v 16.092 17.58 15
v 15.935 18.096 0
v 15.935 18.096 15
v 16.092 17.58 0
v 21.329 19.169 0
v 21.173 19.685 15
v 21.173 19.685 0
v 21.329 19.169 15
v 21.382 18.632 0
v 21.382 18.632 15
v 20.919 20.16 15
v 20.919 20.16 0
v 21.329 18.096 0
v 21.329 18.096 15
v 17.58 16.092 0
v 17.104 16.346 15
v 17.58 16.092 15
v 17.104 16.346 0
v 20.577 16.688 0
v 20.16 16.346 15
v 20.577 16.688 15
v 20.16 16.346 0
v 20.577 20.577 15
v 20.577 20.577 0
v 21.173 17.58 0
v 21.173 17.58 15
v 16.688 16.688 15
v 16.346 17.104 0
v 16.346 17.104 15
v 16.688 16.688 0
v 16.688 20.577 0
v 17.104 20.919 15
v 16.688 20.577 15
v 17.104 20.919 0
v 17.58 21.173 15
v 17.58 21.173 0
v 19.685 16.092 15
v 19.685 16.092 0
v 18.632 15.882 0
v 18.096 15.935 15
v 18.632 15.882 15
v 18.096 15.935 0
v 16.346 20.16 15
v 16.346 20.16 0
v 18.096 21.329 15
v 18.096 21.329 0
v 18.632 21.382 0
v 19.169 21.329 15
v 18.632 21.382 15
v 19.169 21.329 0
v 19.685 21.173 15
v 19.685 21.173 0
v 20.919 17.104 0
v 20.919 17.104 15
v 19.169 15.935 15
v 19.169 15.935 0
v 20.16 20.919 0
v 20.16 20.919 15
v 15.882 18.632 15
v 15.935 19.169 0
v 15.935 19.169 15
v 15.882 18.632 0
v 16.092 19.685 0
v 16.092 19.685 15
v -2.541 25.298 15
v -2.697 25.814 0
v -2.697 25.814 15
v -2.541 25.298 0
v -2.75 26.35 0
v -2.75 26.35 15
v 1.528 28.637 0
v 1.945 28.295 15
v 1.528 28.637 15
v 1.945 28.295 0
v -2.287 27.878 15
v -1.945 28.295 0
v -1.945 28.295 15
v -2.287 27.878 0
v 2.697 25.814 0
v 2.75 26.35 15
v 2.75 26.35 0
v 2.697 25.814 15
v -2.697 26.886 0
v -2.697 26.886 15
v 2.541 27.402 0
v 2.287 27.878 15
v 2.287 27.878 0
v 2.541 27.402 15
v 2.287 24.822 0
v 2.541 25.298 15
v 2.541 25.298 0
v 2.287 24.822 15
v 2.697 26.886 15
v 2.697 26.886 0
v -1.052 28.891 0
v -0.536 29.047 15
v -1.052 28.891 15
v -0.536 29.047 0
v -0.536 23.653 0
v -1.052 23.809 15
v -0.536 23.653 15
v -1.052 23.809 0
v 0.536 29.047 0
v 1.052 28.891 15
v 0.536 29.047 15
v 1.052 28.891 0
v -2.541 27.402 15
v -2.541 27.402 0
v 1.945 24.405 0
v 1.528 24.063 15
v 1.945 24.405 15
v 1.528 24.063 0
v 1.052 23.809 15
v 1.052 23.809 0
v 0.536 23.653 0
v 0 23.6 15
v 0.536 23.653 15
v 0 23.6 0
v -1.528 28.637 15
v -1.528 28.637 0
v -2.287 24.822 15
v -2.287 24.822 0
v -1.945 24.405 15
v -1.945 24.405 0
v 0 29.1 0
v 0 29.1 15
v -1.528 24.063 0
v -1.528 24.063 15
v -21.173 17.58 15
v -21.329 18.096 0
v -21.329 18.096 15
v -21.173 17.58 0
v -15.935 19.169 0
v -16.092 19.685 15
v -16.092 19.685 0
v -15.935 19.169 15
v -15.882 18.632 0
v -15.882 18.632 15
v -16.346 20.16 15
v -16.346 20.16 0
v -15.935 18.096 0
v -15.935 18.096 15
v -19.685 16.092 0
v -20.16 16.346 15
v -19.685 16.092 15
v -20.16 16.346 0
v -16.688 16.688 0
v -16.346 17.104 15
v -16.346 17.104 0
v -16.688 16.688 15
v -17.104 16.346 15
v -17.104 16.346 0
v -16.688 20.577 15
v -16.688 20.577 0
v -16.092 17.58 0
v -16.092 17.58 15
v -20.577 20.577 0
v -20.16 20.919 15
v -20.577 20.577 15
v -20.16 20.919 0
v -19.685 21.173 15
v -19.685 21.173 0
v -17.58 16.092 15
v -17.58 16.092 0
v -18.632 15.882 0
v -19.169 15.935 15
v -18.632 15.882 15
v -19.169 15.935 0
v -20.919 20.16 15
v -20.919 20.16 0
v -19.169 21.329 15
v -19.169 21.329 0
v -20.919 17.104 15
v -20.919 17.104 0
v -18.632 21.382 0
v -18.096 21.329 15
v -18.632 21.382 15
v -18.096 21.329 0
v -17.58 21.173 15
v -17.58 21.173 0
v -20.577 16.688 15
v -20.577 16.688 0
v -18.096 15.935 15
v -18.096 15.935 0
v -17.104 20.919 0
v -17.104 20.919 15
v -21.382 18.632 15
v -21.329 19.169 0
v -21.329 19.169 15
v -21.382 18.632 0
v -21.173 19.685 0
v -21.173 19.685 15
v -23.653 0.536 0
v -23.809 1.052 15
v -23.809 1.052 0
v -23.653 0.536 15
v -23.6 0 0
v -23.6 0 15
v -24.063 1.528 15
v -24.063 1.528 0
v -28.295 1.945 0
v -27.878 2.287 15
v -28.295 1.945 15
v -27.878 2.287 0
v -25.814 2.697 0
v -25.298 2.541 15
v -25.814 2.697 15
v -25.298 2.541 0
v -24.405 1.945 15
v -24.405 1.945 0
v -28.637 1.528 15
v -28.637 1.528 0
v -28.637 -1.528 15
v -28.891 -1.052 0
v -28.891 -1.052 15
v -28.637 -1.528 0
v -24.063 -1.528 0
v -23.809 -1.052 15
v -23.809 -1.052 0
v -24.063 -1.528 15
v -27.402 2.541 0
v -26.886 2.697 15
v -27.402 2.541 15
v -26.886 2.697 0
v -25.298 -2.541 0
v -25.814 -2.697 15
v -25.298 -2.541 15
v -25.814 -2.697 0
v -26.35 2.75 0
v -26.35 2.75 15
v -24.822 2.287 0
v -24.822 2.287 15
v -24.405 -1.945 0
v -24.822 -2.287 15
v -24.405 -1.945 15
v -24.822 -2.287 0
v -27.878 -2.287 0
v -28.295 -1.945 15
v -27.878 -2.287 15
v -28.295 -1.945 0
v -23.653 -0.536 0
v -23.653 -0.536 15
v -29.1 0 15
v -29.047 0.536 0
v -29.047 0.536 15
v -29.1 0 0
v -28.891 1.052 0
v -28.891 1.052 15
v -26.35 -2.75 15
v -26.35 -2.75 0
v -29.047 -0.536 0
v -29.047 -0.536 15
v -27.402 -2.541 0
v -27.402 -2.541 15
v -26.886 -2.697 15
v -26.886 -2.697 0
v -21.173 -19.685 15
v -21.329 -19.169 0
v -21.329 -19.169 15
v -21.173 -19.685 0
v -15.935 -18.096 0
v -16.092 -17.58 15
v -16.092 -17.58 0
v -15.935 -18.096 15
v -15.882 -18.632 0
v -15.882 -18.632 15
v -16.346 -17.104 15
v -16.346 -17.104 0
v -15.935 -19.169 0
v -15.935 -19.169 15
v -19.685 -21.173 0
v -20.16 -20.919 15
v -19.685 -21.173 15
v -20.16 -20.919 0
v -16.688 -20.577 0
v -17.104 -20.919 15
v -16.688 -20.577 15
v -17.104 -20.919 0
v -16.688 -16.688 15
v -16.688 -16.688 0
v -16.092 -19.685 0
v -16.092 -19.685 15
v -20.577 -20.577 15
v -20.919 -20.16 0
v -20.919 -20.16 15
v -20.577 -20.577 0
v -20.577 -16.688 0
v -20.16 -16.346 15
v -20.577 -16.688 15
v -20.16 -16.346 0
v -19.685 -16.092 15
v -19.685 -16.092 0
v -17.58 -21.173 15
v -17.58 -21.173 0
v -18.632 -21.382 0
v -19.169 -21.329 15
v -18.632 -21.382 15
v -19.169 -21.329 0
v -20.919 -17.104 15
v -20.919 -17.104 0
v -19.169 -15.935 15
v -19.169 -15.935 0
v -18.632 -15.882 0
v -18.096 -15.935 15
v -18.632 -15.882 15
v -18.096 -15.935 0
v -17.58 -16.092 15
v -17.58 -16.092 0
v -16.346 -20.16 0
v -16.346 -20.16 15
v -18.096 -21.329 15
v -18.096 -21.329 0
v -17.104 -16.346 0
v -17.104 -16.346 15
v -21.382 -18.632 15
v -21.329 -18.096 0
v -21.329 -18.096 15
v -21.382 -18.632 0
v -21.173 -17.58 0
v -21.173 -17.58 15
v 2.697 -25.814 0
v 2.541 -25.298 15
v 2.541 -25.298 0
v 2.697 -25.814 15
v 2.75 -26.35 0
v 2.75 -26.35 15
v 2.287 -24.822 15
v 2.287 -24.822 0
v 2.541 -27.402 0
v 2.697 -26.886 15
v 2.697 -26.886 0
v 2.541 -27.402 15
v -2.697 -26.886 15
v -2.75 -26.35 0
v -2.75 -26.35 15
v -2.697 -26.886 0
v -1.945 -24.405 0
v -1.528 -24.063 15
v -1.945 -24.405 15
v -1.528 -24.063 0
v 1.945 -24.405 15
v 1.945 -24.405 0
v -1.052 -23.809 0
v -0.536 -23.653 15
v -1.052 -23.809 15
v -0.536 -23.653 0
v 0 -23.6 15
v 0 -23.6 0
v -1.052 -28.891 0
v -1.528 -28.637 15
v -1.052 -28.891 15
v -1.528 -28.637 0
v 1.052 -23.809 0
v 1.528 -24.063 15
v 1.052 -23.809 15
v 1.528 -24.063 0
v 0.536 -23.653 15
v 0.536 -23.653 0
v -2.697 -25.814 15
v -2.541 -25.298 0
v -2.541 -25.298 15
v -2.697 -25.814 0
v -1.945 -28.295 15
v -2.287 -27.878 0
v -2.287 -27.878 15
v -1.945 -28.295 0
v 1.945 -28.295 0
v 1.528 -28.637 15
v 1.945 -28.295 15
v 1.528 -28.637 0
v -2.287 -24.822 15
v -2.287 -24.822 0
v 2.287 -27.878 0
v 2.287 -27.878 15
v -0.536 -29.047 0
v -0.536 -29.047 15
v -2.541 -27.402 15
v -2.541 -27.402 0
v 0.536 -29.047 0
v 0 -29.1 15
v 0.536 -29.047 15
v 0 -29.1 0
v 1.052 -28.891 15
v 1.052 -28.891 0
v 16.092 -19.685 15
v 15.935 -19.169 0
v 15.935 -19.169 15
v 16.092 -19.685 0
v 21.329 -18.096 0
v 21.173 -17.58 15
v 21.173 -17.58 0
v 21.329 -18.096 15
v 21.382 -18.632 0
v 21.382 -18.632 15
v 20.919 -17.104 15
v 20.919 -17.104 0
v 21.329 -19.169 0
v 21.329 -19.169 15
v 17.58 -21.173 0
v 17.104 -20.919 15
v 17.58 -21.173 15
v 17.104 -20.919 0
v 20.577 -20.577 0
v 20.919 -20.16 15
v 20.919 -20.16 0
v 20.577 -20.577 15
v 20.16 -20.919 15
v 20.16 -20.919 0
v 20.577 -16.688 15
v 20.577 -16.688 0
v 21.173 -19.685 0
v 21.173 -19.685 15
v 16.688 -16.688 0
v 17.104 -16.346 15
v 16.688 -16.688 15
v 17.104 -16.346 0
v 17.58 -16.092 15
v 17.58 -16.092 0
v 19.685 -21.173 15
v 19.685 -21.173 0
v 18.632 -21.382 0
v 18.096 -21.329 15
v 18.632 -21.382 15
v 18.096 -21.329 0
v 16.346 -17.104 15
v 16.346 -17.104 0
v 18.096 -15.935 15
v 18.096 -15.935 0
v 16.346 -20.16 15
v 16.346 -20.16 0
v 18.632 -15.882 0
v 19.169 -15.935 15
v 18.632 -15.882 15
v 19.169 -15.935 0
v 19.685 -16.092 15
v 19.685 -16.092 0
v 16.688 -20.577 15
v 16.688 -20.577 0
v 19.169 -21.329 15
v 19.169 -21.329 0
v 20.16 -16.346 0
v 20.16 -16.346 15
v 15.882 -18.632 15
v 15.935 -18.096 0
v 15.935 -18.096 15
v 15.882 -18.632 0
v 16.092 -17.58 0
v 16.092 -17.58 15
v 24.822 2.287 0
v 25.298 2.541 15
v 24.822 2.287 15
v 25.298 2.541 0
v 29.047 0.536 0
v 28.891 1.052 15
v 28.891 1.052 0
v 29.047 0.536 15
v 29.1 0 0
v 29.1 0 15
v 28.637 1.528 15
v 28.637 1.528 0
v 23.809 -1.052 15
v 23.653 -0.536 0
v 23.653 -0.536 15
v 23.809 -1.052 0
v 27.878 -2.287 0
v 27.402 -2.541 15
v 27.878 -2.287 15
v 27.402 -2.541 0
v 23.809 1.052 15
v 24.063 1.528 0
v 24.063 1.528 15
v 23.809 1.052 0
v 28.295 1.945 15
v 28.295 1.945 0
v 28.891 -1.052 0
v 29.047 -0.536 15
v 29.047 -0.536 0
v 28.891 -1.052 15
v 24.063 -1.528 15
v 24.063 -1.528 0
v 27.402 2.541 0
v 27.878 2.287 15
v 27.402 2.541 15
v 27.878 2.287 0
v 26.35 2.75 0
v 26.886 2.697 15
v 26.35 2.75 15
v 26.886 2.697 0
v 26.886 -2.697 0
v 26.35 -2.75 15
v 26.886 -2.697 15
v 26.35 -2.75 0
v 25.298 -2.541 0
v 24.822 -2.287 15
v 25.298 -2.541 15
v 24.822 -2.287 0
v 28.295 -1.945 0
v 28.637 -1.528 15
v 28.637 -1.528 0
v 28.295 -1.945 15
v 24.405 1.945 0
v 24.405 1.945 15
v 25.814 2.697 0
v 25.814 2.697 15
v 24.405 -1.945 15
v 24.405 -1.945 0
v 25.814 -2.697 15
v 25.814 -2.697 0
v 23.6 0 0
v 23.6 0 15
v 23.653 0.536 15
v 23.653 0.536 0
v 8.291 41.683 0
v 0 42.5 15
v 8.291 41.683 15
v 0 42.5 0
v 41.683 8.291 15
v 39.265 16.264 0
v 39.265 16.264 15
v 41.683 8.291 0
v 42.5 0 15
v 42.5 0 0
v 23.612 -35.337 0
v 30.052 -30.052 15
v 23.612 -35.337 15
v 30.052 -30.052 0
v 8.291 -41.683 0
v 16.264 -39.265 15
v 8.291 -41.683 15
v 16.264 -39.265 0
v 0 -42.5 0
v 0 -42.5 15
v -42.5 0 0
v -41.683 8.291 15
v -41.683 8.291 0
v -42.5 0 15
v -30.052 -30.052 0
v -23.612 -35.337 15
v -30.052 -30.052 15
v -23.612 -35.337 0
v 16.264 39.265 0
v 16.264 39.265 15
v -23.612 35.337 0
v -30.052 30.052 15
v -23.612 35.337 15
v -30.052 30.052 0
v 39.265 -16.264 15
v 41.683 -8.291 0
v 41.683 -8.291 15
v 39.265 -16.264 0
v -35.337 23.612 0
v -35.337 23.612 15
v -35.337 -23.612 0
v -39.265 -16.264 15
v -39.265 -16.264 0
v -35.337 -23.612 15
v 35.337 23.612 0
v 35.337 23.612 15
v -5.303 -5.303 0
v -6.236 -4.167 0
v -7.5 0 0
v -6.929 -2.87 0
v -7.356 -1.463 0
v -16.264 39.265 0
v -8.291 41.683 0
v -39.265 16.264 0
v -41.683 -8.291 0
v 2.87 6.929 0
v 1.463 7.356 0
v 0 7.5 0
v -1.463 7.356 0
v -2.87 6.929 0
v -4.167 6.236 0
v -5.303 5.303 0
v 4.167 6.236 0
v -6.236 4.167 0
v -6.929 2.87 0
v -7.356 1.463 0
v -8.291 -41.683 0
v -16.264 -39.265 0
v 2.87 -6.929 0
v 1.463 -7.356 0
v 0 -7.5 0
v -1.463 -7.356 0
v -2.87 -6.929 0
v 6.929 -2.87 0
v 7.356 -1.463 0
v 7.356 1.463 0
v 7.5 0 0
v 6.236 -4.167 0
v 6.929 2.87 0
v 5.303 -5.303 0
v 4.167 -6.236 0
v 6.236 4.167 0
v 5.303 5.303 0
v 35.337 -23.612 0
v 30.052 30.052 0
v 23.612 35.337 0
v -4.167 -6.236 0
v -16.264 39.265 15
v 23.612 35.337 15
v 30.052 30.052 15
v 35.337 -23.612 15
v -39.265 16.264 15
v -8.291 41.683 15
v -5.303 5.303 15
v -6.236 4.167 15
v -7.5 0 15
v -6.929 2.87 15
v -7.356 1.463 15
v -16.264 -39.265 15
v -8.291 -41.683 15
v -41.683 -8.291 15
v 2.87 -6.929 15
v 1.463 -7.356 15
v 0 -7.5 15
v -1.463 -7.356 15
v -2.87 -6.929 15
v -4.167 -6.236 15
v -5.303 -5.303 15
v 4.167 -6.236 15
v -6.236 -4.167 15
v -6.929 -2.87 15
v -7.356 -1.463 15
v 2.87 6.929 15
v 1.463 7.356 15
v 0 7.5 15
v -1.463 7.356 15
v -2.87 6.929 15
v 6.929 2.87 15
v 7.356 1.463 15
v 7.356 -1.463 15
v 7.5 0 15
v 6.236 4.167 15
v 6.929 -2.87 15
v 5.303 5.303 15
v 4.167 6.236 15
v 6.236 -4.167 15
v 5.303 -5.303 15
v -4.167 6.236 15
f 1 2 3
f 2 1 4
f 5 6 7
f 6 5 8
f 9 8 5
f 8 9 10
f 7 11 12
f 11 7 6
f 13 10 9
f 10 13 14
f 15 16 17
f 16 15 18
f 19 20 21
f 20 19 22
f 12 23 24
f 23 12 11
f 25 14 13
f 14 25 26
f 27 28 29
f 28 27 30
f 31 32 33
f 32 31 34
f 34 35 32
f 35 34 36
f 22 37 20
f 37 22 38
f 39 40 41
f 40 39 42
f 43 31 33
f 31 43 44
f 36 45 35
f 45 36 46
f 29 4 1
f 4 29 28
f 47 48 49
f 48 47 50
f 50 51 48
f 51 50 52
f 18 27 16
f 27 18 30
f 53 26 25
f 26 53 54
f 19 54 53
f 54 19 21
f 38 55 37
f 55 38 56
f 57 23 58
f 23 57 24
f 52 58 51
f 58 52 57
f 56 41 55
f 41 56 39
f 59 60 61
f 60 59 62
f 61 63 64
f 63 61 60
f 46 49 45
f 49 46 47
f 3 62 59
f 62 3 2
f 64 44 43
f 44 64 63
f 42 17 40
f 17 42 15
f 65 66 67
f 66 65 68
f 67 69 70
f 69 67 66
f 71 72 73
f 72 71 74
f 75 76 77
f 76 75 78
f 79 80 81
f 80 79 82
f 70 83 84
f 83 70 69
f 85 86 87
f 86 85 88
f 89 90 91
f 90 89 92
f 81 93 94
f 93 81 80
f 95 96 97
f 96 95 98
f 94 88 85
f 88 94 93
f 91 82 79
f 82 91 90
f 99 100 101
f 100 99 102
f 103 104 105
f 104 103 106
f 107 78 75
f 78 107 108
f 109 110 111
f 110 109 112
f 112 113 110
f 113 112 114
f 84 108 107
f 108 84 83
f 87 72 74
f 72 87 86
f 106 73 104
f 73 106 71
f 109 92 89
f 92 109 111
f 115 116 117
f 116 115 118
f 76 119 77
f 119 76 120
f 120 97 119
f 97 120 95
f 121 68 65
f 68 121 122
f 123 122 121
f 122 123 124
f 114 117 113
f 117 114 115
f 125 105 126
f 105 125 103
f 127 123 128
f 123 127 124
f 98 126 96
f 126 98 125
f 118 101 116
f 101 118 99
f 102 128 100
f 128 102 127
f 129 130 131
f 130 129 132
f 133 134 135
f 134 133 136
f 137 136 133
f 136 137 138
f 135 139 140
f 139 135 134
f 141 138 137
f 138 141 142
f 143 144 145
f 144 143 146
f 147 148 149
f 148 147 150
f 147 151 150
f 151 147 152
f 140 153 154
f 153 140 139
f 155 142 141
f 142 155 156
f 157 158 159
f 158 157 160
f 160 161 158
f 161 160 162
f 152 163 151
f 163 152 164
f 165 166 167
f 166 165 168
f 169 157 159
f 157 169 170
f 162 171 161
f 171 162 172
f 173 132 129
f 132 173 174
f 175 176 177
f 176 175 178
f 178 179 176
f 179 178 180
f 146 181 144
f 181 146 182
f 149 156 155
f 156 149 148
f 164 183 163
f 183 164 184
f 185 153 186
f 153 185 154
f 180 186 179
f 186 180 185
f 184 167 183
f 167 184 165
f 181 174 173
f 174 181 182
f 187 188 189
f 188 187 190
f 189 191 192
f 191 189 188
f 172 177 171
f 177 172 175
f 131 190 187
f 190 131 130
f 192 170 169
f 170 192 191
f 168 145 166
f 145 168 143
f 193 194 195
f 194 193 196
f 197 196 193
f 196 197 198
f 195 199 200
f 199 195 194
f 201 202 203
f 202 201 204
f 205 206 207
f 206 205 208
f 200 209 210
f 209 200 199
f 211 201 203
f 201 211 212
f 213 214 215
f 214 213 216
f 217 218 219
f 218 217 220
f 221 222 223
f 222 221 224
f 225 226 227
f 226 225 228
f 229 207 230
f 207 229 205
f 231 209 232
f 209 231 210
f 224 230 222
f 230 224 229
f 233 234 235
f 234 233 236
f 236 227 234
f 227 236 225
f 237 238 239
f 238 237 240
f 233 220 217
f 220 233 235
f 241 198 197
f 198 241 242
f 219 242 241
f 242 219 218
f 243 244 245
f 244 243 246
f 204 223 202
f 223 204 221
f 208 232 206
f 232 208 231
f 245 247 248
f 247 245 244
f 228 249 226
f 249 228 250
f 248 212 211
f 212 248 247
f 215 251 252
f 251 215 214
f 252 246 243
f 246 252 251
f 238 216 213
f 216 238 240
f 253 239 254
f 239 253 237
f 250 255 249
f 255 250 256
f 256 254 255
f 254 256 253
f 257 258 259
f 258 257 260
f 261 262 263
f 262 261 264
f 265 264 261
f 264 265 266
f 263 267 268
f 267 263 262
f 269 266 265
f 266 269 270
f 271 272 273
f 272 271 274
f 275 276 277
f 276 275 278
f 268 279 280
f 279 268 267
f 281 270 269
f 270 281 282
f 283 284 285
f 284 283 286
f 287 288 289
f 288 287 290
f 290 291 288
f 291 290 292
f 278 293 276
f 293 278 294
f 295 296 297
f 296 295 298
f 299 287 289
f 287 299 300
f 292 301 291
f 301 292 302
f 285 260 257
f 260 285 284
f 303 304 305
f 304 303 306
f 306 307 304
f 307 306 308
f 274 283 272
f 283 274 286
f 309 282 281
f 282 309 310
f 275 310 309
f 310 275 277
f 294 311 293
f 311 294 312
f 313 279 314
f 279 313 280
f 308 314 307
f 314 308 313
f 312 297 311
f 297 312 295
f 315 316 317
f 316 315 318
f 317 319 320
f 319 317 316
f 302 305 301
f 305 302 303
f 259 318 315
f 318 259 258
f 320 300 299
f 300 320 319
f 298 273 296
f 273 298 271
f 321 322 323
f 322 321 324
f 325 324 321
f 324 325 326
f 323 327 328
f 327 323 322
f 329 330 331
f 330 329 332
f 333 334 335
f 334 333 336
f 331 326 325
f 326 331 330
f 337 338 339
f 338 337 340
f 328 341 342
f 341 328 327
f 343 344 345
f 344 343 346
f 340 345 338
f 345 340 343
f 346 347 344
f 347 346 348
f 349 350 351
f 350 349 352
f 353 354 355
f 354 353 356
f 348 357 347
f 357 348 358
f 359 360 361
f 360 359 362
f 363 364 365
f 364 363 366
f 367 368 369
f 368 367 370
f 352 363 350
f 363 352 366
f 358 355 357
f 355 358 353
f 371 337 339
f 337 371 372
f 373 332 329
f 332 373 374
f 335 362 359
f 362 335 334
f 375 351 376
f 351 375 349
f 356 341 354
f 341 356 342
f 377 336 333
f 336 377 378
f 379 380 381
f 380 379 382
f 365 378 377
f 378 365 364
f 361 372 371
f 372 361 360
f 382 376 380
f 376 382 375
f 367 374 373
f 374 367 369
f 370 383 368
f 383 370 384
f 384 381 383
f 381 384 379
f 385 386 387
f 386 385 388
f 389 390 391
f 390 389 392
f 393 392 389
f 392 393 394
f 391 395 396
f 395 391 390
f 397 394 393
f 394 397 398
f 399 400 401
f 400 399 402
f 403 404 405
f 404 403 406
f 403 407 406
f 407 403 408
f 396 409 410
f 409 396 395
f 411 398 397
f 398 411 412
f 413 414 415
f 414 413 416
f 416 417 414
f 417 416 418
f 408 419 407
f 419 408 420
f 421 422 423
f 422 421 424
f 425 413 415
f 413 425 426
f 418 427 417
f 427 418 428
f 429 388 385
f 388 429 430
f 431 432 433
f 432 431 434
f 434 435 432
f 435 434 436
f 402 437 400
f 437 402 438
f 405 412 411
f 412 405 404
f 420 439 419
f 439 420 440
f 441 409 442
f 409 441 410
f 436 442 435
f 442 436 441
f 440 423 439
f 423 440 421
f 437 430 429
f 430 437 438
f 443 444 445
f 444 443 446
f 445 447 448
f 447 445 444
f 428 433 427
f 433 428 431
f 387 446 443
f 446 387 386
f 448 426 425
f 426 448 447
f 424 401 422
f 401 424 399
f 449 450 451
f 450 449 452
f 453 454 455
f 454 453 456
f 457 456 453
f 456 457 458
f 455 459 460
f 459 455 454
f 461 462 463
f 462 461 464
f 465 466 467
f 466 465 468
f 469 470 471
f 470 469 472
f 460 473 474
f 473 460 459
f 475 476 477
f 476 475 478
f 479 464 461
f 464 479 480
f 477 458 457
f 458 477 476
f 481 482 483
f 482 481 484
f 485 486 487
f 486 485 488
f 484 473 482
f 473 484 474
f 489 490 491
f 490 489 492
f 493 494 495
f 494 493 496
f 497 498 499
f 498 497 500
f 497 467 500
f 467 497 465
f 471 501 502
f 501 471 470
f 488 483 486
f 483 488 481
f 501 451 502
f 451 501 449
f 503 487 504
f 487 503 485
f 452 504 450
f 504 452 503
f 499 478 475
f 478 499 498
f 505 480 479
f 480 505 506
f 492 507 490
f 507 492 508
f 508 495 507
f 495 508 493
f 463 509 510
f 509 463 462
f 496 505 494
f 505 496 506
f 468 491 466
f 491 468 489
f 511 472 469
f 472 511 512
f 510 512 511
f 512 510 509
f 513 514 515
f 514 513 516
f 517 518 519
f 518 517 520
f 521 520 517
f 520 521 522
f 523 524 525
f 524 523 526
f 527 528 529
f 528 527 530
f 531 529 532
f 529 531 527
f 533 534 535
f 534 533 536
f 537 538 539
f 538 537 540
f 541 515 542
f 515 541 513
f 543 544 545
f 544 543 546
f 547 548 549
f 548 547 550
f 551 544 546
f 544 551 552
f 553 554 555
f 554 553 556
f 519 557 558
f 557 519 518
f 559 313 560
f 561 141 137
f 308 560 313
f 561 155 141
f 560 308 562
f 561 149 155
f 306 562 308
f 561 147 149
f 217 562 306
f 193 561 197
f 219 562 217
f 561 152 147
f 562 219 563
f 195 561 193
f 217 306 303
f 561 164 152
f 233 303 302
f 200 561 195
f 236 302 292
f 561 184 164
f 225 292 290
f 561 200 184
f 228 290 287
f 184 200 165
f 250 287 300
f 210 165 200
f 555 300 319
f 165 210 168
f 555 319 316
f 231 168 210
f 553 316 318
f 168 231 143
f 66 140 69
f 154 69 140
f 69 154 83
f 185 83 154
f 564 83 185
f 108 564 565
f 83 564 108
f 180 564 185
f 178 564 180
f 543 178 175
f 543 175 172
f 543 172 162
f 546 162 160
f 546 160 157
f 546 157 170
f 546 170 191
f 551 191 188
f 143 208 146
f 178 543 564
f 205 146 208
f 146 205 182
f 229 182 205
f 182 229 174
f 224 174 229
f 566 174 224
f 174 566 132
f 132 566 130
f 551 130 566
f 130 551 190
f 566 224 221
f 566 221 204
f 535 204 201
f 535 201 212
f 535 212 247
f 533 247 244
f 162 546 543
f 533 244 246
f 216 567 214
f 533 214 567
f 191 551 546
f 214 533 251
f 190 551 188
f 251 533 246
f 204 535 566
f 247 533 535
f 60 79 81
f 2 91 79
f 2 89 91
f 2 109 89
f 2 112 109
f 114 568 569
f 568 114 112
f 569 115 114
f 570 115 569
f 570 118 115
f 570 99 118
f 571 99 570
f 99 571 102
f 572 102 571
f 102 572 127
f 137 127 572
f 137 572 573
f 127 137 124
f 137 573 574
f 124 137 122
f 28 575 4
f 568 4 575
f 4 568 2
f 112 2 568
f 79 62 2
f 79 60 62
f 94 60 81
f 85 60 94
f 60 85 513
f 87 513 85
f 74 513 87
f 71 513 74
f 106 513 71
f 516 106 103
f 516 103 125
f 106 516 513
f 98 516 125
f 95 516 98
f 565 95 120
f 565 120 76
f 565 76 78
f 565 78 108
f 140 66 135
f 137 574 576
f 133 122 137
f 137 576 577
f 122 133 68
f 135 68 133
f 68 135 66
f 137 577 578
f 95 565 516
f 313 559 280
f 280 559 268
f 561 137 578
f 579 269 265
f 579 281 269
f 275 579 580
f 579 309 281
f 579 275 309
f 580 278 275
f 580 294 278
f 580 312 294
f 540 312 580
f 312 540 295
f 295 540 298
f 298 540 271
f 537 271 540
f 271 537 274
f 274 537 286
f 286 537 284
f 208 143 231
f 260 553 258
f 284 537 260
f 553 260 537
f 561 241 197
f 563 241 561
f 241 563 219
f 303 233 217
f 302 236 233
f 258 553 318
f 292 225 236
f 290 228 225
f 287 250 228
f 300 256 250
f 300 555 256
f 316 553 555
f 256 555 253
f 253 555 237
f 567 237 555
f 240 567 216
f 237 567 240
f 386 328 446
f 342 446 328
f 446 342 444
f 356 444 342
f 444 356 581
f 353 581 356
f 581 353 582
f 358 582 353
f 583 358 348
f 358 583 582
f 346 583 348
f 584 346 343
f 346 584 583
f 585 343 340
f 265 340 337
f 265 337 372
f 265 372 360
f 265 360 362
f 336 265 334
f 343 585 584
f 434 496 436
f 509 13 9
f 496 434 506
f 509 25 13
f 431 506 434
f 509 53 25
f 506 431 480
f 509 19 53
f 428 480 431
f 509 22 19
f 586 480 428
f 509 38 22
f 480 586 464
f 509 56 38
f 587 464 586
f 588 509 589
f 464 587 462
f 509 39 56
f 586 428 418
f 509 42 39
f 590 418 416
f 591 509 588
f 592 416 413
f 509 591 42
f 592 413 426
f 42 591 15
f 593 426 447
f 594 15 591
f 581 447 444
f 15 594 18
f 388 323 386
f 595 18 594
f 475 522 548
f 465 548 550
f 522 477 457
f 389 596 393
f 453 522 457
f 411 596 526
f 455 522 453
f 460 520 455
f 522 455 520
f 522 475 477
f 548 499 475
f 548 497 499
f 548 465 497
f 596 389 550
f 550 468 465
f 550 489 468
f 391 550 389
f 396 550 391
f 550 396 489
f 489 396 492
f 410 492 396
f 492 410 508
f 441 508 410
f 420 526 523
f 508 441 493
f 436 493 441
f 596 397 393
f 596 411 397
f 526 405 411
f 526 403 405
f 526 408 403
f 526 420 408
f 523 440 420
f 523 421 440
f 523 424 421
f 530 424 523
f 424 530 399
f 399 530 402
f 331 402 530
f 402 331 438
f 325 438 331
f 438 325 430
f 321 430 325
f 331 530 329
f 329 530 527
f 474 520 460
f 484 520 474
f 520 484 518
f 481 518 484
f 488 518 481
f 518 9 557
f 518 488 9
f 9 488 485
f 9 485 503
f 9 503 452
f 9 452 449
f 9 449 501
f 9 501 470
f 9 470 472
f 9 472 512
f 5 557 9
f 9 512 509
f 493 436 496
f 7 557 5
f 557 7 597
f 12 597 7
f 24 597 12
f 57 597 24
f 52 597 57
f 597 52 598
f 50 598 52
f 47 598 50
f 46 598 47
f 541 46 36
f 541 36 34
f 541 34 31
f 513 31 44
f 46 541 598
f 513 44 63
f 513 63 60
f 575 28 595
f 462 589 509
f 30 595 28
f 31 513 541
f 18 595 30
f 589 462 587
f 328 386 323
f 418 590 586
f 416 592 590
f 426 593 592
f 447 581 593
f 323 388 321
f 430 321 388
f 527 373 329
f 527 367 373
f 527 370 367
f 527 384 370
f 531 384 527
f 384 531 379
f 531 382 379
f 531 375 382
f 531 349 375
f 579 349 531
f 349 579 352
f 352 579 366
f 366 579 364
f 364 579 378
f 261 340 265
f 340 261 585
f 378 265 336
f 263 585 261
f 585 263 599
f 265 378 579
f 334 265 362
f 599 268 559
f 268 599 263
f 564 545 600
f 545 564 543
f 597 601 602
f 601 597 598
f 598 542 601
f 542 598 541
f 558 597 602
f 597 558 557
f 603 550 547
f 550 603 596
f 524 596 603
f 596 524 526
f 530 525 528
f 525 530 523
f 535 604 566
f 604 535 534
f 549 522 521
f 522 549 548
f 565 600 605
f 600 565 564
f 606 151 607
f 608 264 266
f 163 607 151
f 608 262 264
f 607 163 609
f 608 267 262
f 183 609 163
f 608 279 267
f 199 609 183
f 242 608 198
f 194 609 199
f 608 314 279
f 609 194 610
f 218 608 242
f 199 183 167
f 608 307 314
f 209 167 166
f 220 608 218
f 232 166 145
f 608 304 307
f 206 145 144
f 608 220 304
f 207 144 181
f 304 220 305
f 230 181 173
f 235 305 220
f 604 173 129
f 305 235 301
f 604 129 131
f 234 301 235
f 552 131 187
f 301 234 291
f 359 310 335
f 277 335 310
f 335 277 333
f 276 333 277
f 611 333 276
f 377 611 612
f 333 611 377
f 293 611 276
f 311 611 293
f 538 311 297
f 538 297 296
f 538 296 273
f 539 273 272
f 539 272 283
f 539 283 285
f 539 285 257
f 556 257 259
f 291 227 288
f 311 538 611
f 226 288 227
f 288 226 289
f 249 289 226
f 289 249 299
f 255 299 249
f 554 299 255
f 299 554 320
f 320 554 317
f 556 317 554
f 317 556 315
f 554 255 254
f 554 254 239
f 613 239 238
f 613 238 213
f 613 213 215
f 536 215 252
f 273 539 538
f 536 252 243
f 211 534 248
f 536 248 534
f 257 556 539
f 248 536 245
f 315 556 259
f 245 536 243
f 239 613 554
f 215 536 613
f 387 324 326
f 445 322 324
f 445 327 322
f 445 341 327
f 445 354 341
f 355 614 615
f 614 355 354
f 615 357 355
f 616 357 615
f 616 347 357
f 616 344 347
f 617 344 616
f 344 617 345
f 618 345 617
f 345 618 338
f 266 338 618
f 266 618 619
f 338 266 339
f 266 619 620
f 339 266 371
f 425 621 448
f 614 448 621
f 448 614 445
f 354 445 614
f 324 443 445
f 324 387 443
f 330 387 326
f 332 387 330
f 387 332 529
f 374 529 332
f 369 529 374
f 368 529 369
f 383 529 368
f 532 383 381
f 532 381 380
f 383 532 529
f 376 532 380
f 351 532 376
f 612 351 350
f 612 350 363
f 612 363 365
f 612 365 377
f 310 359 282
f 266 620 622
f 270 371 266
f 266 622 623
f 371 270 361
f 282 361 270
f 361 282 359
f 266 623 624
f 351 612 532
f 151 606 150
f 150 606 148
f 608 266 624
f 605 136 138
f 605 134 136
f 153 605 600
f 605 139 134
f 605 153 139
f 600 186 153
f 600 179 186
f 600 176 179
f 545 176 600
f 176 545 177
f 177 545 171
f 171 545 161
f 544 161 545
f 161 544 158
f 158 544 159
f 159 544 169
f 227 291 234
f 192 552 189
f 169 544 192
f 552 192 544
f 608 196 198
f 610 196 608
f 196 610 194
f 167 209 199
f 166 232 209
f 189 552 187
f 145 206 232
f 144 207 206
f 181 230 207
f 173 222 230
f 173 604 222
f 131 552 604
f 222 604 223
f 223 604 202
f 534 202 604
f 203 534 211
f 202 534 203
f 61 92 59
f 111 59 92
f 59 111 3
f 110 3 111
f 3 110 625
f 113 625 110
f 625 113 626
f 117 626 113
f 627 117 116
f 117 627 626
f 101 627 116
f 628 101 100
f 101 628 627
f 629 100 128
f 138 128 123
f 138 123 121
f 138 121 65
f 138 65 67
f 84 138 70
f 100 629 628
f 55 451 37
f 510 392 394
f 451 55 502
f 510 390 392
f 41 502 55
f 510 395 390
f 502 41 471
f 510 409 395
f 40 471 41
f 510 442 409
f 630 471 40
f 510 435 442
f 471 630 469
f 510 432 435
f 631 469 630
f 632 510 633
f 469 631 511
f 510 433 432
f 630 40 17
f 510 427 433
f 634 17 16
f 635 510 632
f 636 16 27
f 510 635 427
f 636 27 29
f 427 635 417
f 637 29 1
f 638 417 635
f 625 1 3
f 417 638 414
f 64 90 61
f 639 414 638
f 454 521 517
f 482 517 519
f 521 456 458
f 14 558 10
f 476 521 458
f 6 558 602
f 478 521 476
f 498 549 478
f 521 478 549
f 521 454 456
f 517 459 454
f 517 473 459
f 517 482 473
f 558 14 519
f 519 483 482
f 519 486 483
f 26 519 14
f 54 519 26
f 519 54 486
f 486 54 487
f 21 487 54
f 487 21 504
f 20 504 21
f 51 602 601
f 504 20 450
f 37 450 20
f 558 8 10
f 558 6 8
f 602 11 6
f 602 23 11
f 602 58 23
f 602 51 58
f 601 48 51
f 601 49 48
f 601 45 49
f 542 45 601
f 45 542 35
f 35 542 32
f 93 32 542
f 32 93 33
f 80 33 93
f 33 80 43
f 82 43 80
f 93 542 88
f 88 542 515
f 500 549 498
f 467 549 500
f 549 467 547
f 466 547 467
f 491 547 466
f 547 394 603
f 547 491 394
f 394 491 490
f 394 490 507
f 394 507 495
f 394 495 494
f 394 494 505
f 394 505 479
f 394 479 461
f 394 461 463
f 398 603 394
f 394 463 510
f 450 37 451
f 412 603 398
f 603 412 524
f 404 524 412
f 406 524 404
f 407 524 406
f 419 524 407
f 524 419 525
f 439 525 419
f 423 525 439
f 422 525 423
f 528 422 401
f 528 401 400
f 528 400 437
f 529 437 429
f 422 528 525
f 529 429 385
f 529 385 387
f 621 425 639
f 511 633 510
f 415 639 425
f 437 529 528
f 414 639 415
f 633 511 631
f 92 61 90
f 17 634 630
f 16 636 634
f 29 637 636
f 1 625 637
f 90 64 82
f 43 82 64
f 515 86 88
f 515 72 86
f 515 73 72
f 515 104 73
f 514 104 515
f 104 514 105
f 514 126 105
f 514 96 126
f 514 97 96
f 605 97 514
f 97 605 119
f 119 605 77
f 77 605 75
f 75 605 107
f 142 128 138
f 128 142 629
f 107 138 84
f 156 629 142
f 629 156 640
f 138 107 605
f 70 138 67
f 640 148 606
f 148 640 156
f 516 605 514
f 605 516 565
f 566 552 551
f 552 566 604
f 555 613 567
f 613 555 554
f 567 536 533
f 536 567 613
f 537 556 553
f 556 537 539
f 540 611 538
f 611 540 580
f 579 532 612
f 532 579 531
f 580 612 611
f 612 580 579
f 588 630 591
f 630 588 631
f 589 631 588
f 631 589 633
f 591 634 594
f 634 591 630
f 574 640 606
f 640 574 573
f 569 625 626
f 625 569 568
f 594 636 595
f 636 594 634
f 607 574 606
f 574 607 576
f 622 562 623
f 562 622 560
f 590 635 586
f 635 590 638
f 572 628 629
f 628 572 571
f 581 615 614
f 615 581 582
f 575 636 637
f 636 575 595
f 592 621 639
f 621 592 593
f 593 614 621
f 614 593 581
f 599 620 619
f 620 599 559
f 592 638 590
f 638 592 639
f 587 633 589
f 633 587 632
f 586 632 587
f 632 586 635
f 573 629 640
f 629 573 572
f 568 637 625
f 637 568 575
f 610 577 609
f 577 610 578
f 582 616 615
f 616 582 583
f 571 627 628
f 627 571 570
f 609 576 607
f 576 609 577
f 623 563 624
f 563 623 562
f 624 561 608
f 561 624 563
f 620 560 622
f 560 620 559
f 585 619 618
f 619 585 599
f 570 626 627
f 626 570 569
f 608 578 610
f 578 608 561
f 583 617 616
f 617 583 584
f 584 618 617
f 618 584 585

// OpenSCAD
$fn = 32;

// ----------------------------------------------------------------------
// Flange Ø85 x 15
// 8 holes on a Ø52.7 bolt circle, bolted joints
// ----------------------------------------------------------------------

// --- parameters (mm) ---
flange_d = 85;   // outside diameter of the flange
thickness = 15;  // flange thickness
holes = 8;       // number of bolt holes
pcd = 52.7;      // bolt circle diameter
start_deg = 45;  // angle of the first hole, from +X
hole_d = 5.5;    // bolt hole diameter
bore_d = 15;     // central through bore
hub_d = 25;      // hub outside diameter
hub_h = 0;       // hub height above the flange face (0 = no hub)

// --- derived feature positions (mm) ---
height = thickness + hub_h;  // = 15   overall height of the part
pcd_r = pcd / 2;             // = 26.35   bolt circle radius
hole_step = 360 / holes;     // = 45   angular pitch
feature_centers = [
  [pcd_r * cos(start_deg + 0 * hole_step), pcd_r * sin(start_deg + 0 * hole_step)],
  [pcd_r * cos(start_deg + 1 * hole_step), pcd_r * sin(start_deg + 1 * hole_step)],
  [pcd_r * cos(start_deg + 2 * hole_step), pcd_r * sin(start_deg + 2 * hole_step)],
  [pcd_r * cos(start_deg + 3 * hole_step), pcd_r * sin(start_deg + 3 * hole_step)],
  [pcd_r * cos(start_deg + 4 * hole_step), pcd_r * sin(start_deg + 4 * hole_step)],
  [pcd_r * cos(start_deg + 5 * hole_step), pcd_r * sin(start_deg + 5 * hole_step)],
  [pcd_r * cos(start_deg + 6 * hole_step), pcd_r * sin(start_deg + 6 * hole_step)],
  [pcd_r * cos(start_deg + 7 * hole_step), pcd_r * sin(start_deg + 7 * hole_step)]
];   // bolt hole centres on the pitch circle

// flange disc, every hole and the bore cut straight through
difference() {
  union() {
    cylinder(d = flange_d, h = thickness);
  }
  translate([0, 0, -1]) cylinder(d = bore_d, h = height + 2);  // bore, through
  for (centre = feature_centers)
    translate([centre[0], centre[1], -1]) cylinder(d = hole_d, h = thickness + 2);
}
